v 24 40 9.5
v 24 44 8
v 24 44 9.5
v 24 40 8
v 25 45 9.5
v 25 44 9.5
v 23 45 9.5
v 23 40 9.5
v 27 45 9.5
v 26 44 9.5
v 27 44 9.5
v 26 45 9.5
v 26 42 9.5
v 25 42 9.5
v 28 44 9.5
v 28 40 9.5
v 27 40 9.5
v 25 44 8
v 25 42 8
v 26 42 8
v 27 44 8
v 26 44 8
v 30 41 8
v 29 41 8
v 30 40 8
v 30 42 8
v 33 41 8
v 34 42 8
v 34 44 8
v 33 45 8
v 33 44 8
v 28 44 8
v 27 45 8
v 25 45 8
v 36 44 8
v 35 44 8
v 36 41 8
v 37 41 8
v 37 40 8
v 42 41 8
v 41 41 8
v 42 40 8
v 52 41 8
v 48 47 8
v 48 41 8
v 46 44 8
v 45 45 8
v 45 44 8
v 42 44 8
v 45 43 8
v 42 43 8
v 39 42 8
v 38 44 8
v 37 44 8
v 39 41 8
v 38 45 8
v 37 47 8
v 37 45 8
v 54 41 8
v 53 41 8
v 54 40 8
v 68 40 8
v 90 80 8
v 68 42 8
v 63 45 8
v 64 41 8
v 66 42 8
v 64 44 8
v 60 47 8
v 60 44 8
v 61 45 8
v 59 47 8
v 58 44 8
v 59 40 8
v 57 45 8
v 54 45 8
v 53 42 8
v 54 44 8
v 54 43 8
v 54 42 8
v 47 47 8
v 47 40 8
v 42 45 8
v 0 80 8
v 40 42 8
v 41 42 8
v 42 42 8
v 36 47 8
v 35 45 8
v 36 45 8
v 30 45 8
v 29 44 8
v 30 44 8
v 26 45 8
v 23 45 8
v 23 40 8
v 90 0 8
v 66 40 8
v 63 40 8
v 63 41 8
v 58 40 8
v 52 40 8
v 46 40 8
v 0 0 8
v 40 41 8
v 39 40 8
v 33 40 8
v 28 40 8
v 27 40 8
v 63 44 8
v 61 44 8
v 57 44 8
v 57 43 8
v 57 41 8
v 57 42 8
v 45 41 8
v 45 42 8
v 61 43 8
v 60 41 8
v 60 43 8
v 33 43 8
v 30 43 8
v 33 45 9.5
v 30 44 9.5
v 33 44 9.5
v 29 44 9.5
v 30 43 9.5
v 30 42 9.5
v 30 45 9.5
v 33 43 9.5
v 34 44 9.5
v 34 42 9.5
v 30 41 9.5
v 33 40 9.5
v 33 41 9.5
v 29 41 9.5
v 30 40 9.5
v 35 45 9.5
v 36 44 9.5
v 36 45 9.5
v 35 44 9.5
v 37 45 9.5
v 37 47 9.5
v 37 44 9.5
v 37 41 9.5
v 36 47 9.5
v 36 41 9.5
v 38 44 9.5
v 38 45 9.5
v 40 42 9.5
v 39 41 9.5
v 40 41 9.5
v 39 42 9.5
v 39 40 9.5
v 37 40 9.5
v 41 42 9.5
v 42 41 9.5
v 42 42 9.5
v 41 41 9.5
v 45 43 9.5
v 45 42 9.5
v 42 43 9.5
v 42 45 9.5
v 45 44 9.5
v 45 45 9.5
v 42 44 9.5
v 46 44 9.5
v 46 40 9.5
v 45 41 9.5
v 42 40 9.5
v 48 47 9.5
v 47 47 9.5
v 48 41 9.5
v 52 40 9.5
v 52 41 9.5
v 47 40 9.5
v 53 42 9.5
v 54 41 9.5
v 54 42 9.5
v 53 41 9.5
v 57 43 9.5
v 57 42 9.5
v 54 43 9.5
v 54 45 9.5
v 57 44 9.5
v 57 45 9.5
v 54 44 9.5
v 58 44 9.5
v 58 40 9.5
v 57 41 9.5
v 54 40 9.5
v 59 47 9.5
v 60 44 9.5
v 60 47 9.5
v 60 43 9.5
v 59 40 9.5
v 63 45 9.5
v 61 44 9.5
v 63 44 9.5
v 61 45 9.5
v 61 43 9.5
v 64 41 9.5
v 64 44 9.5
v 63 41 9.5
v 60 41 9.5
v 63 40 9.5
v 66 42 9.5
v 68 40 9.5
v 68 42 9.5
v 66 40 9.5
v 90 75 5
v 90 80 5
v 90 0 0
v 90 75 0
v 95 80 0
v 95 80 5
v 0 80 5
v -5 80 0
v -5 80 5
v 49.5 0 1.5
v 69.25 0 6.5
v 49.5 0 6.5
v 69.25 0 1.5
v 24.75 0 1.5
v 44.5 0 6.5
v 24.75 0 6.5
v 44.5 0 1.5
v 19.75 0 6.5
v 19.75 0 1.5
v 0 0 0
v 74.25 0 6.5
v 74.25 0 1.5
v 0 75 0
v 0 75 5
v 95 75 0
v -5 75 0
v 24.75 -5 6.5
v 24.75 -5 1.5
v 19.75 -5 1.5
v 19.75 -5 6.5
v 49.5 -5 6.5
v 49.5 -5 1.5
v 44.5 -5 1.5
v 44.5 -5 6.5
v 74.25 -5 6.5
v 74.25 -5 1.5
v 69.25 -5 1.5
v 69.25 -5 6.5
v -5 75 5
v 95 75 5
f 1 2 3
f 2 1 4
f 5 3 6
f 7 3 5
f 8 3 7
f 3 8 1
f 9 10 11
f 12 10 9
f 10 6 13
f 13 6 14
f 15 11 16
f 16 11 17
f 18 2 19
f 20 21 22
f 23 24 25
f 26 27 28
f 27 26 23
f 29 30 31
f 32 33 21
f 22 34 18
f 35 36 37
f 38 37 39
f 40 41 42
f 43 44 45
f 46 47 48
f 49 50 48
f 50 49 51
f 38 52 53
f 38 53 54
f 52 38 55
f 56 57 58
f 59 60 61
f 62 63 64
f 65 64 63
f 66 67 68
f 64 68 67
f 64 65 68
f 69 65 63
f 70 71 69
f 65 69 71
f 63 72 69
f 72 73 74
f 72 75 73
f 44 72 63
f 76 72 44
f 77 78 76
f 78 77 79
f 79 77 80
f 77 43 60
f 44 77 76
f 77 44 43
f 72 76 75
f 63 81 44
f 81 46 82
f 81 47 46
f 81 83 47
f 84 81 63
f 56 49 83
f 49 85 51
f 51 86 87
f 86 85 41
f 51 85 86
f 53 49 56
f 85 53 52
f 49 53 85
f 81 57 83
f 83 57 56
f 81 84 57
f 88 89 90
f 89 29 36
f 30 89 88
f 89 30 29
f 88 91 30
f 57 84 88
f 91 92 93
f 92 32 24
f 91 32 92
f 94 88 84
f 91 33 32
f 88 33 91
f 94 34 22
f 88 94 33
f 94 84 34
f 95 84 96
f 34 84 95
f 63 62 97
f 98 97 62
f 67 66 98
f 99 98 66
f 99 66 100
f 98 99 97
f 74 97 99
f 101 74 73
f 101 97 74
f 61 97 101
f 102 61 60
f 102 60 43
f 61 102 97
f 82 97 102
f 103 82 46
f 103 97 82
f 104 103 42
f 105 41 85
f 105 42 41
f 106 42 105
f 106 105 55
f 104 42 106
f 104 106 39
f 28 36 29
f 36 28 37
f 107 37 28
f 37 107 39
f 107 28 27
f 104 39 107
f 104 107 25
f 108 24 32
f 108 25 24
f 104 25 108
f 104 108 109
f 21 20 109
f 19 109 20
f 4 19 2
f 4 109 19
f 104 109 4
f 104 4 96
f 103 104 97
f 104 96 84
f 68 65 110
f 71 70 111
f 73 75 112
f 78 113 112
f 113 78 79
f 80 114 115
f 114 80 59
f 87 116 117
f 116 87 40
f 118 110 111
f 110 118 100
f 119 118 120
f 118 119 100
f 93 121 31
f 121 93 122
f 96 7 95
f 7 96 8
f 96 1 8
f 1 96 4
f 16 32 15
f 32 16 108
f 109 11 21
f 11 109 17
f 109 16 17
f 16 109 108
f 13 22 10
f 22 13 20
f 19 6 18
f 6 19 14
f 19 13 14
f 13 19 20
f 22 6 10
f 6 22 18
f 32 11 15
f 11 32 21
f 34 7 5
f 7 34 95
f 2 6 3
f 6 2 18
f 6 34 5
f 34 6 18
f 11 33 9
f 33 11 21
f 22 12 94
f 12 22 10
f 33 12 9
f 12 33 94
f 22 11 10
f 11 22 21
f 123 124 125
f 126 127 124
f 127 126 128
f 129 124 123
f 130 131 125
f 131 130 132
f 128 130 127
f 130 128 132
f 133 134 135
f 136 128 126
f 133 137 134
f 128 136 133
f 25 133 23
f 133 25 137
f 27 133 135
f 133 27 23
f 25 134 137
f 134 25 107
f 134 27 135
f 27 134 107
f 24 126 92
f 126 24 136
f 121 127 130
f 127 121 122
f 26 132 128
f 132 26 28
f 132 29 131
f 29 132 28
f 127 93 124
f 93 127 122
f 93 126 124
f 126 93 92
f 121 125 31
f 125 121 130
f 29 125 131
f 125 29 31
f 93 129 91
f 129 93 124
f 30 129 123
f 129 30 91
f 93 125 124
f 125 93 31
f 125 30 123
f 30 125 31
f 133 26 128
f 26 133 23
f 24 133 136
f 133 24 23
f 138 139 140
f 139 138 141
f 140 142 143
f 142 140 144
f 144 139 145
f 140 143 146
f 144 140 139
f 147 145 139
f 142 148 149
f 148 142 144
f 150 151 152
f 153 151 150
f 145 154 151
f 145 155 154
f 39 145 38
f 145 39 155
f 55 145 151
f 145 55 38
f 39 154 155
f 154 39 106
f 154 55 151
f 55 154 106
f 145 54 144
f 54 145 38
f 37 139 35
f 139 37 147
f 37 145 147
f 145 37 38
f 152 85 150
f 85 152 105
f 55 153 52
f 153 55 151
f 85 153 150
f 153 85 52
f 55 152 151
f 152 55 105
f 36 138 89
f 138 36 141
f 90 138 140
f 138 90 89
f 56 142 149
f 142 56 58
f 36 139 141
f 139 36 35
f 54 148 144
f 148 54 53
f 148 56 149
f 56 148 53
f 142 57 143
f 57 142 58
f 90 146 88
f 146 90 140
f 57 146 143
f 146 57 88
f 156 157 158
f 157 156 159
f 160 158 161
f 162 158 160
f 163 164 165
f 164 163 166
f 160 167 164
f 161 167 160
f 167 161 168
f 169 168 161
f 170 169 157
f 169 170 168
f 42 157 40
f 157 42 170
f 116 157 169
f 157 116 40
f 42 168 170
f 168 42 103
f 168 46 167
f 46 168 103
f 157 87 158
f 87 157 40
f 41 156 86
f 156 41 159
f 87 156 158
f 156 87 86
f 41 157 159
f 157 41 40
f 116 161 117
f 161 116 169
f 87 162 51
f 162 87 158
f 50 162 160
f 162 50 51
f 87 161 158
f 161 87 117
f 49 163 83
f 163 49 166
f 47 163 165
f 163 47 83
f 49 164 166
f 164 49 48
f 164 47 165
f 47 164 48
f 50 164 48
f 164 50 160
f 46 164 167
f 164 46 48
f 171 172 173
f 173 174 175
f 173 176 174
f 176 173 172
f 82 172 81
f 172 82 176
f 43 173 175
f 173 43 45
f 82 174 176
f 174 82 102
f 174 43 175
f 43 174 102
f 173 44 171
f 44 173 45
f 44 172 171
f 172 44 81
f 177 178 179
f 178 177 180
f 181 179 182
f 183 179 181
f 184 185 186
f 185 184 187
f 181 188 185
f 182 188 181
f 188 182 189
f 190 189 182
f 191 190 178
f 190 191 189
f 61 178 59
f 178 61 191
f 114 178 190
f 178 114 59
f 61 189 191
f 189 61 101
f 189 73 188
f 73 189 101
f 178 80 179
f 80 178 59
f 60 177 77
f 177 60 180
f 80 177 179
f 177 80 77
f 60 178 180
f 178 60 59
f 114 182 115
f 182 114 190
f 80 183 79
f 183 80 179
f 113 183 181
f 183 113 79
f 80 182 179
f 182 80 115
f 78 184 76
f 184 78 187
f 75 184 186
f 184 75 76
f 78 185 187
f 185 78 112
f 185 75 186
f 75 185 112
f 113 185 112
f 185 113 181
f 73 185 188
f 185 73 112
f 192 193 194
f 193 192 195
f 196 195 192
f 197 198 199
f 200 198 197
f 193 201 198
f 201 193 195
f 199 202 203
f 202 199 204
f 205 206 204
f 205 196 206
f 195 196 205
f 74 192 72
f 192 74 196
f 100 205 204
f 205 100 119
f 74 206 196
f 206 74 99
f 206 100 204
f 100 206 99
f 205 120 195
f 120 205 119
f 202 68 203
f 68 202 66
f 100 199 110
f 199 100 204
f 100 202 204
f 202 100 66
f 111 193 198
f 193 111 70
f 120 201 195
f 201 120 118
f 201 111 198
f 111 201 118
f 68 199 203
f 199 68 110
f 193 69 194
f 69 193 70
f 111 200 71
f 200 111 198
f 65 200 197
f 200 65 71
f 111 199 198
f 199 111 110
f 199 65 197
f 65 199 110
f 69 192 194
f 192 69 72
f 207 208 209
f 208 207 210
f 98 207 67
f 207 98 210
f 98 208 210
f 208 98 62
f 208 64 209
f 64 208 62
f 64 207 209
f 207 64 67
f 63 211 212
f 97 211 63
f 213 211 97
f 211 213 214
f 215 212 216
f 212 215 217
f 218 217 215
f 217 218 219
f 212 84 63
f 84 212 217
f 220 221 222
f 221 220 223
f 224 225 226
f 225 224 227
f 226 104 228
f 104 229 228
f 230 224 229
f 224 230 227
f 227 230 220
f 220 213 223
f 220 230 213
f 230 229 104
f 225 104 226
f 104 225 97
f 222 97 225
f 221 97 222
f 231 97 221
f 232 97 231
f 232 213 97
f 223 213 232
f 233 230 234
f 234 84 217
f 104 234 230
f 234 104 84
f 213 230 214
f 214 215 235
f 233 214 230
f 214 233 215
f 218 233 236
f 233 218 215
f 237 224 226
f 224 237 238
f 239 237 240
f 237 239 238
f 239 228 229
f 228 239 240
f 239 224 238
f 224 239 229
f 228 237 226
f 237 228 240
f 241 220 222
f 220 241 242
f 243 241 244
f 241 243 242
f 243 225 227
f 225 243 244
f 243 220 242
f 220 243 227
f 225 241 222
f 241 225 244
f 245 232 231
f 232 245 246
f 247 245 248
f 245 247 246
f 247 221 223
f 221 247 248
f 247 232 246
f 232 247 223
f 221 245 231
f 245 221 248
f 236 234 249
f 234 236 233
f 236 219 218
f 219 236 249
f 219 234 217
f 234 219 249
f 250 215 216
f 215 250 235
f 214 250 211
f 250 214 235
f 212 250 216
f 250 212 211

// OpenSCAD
//
//if (accessories=="ON"){
//	color([222/255,184/255,135/255]) translate([-50,33.5,-3]) board();
//	translate([-10,15,0]) Arduino(0,0,0);
//} 
//if (mode=="EXPLODED"){
//	baseWCuts();
//	translate([-45,-80,30]) backDoor();
//	translate([0,30,30]) frontPanel();
//	translate([0,30,30]) mirror([1,0,0]) frontPanel();
//}
//if (mode=="ASSEMBLED"){
//	baseWCuts();
//	translate([-45,-50,0]) backDoor();
//	frontPanel();
//	mirror([1,0,0]) frontPanel();
//}
//if (mode=="PARTS"){
//	baseWCuts();
//	translate([280,-10,40]) rotate([270,0,0]) frontPanel();
//	translate([-250,0,10]) rotate([270,0,0]) backDoor();
//	translate([230,-10,40]) mirror([1,0,0]) rotate([270,0,0]) frontPanel();
//
//}

translate([0,0,8]) rotate([270,0,0]) backDoor();

//
///////////////////////////////
/* MAIN CONSTRUCTOR MODULES */
//////////////////////////////


//Creates exact front panel with cuts using frontPanelBasic()
module frontPanel(){ 
	difference(){
		translate([-126.5,52,0]) frontPanelBasic();
		baseWCuts();
		translate([-50,33.5,-3]) board();
		translate([65,10,95]) rotate([90,0,0]) cylinder(r=6.5,h=20);
		translate([-58,72.5,-10]) cylinder(r=3.25,h=20);//cuts panel screw holes
		translate([-84,72.5,-10]) cylinder(r=3.25,h=20);
	}
}

//Creates basic block front panel without cuts
module frontPanelBasic(){ 
	union(){
		cube([81.5,8,80]);
		translate([31.5,0,-3]) cube([50,33,8]);
		translate([73.5,-20,-5]) cube([8,20,85]);
		translate([-6.5,-23,0]) cube([8,31,80]);
	}
}

//Creates full base with sides, floor, and all necessary cuts
module baseWCuts(){
	difference(){
		base();
		translate([-50,33.5,-3]) board(); //cuts board
		translate([-10,15,0]) Arduino(0,0,0); //cuts arduino
		translate([-45,-50,0]) backDoor(); //cuts back door
		translate([-70,55,-3]) cube([140,30,3]); //cuts indent in prongs
		translate([-62.5,10,95]) rotate([90,0,0]) cylinder(r=3.25,h=20); //cuts hanger
		translate([62.5,10,95]) rotate([90,0,0]) cylinder(r=3.25,h=20);
		translate([-58,72.5,-10]) cylinder(r=3.25,h=20);//cuts panel screw holes
		translate([-84,72.5,-10]) cylinder(r=3.25,h=20);
		translate([58,72.5,-10]) cylinder(r=3.25,h=20);
		translate([84,72.5,-10]) cylinder(r=3.25,h=20);
		translate([-53,-5,2]) cube([15,15,15]); //cuts arduino extension port
		translate([-50,36.5,-3]) cube([100,20,3]);
	}
}

//Creates simple base with floor and sides
module base(){
	union(){
		translate([-53,-50,-8]) floor();
		translate([-53,-50,0]) sides();
		translate([-80,-4,80]) cube([35,12,25]); //creates top hinges 
		translate([45,-4,80]) cube([35,12,25]);
	}
}

//Creates back door that will fit into slots in the base.
module backDoor(){
	union(){
		cube([90,8,80]);
	
		translate([19.75,1.5,-5]) cube([5,5,5]); //bottom notches
		translate([44.5,1.5,-5]) cube([5,5,5]);
		translate([69.25,1.5,-5]) cube([5,5,5]);
	
		translate([-5,3,75]) cube([5,5,5]);//top notches
		translate([90,3,75]) cube([5,5,5]);
	
		translate([23,0,40]) rotate([90,0,0]) scale([1,1,1.5]) drawtext("metaLab."); //text
	}
}

//Creates walls including slants
module sides(){

	cube([8,85,80]);
	translate([98,0,0]) cube([8,85,80]);
	translate([-80,70,0]) slant();
	translate([186,70,0]) mirror([1,0,0]) slant();

}

//creates slanted L shaped wall
module slant(){
	polyhedron(
	points = [ [0,0,0],[80,0,0],[0,10,0],[8,10,0],[8,8,0], [80,8,0],
				[0,-20,80],[80,-20,80],[0,10,80],[8,10,80],[8,-12,80],
				[80,-12,80] ],

	faces = [ [0,1,5,4,3,2] ,[6,8,9,10,11,7], [2,8,6,0],
				[0,6,7,1], [1,7,11,5], [5,11,10,4], [4,10,9,3],
				[3,9,8,2]]


	);
}

//Creates floor of the enclosure
module floor(){
	union(){
		cube([106,86,8]);
		
		translate([-80,70,0]) cube([80,40,8]);//wings
		translate([106,70,0]) cube([80,40,8]);
	
		translate([-42,85,0]) cube([50,50,8]); //prongs
		translate([98,85,0]) cube([50,50,8]);
		diagonal();
		translate([106,0,0]) mirror([1,0,0]) diagonal();
	}
}

//Creates triangle inlet for floor
module diagonal(){
	polyhedron(
		points = [ [0,50,0],[0,70,0],[-20,70,0],[0,50,8],[0,70,8],[-20,70,8]],
		faces = [ [2,1,0],[3,4,5],[2,0,3,5],[0,1,4,3],[1,2,5,4] ]
	);
}

//Models enclosed circuit board
module board(){
	union(){
		cube([100,3,85]);
		translate([-87.5,-6,11.25]) cube([95,16,16]);//left
		translate([-87.5,-6,31.75]) cube([95,16,16]);
		translate([-87.5,-6,52.25]) cube([95,16,16]);
	
		translate([92.5,-6,11.25]) cube([95,16,16]);//right
		translate([92.5,-6,31.75]) cube([95,16,16]);
		translate([92.5,-6,52.25]) cube([95,16,16]);
	}
}

/////////////////////////
//TEXT DRAWING MODULES//
////////////////////////
//You can ignore these//

module drawtext(text) {
	//Characters
	chars = " !\"#$%&'()*+,-./0123456789:;<=>?@ABCDEFGHIJKLMNOPQRSTUVWXYZ[\\]^_`abcdefghijklmnopqrstuvwxyz{|}";

	//Chracter table defining 5x7 characters
	//Adapted from: http://www.geocities.com/dinceraydin/djlcdsim/chartable.js
	char_table = [ [ 0, 0, 0, 0, 0, 0, 0],
                  [ 4, 0, 4, 4, 4, 4, 4],
                  [ 0, 0, 0, 0,10,10,10],
                  [10,10,31,10,31,10,10],
                  [ 4,30, 5,14,20,15, 4],
                  [ 3,19, 8, 4, 2,25,24],
                  [13,18,21, 8,20,18,12],
                  [ 0, 0, 0, 0, 8, 4,12],
                  [ 2, 4, 8, 8, 8, 4, 2],
                  [ 8, 4, 2, 2, 2, 4, 8],
                  [ 0, 4,21,14,21, 4, 0],
                  [ 0, 4, 4,31, 4, 4, 0],
                  [ 8, 4,12, 0, 0, 0, 0],
                  [ 0, 0, 0,31, 0, 0, 0],
                  [12,12, 0, 0, 0, 0, 0],
                  [ 0,16, 8, 4, 2, 1, 0],
                  [14,17,25,21,19,17,14],
                  [14, 4, 4, 4, 4,12, 4],
                  [31, 8, 4, 2, 1,17,14],
                  [14,17, 1, 2, 4, 2,31],
                  [ 2, 2,31,18,10, 6, 2],
                  [14,17, 1, 1,30,16,31],
                  [14,17,17,30,16, 8, 6],
                  [ 8, 8, 8, 4, 2, 1,31],
                  [14,17,17,14,17,17,14],
                  [12, 2, 1,15,17,17,14],
                  [ 0,12,12, 0,12,12, 0],
                  [ 8, 4,12, 0,12,12, 0],
                  [ 2, 4, 8,16, 8, 4, 2],
                  [ 0, 0,31, 0,31, 0, 0],
                  [16, 8, 4, 2, 4, 8,16],
                  [ 4, 0, 4, 2, 1,17,14],
                  [14,21,21,13, 1,17,14],
                  [17,17,31,17,17,17,14],
                  [30,17,17,30,17,17,30],
                  [14,17,16,16,16,17,14],
                  [30,17,17,17,17,17,30],
                  [31,16,16,30,16,16,31],
                  [16,16,16,30,16,16,31],
                  [15,17,17,23,16,17,14],
                  [17,17,17,31,17,17,17],
                  [14, 4, 4, 4, 4, 4,14],
                  [12,18, 2, 2, 2, 2, 7],
                  [17,18,20,24,20,18,17],
                  [31,16,16,16,16,16,16],
                  [17,17,17,21,21,27,17],
                  [17,17,19,21,25,17,17],
                  [14,17,17,17,17,17,14],
                  [16,16,16,30,17,17,30],
                  [13,18,21,17,17,17,14],
                  [17,18,20,30,17,17,30],
                  [30, 1, 1,14,16,16,15],
                  [ 4, 4, 4, 4, 4, 4,31],
                  [14,17,17,17,17,17,17],
                  [ 4,10,17,17,17,17,17],
                  [10,21,21,21,17,17,17],
                  [17,17,10, 4,10,17,17],
                  [ 4, 4, 4,10,17,17,17],
                  [31,16, 8, 4, 2, 1,31],
                  [14, 8, 8, 8, 8, 8,14],
                  [ 0, 1, 2, 4, 8,16, 0],
                  [14, 2, 2, 2, 2, 2,14],
                  [ 0, 0, 0, 0,17,10, 4],
                  [31, 0, 0, 0, 0, 0, 0],
                  [ 0, 0, 0, 0, 2, 4, 8],
                  [15,17,15, 1,14, 0, 0],
                  [30,17,17,25,22,16,16],
                  [14,17,16,16,14, 0, 0],
                  [15,17,17,19,13, 1, 1],
                  [14,16,31,17,14, 0, 0],
                  [ 8, 8, 8,28, 8, 9, 6],
                  [14, 1,15,17,15, 0, 0],
                  [17,17,17,25,22,16,16],
                  [14, 4, 4, 4,12, 0, 4],
                  [12,18, 2, 2, 2, 6, 2],
                  [18,20,24,20,18,16,16],
                  [14, 4, 4, 4, 4, 4,12],
                  [17,17,21,21,26, 0, 0],
                  [17,17,17,25,22, 0, 0],
                  [14,17,17,17,14, 0, 0],
                  [16,16,30,17,30, 0, 0],
                  [ 1, 1,15,19,13, 0, 0],
                  [16,16,16,25,22, 0, 0],
                  [30, 1,14,16,15, 0, 0],
                  [ 6, 9, 8, 8,28, 8, 8],
                  [13,19,17,17,17, 0, 0],
                  [ 4,10,17,17,17, 0, 0],
                  [10,21,21,17,17, 0, 0],
                  [17,10, 4,10,17, 0, 0],
                  [14, 1,15,17,17, 0, 0],
                  [31, 8, 4, 2,31, 0, 0],
                  [ 2, 4, 4, 8, 4, 4, 2],
                  [ 4, 4, 4, 4, 4, 4, 4],
                  [ 8, 4, 4, 2, 4, 4, 8] ];

	//Binary decode table
	dec_table = [ "00000", "00001", "00010", "00011", "00100", "00101",
  	            "00110", "00111", "01000", "01001", "01010", "01011",
  	            "01100", "01101", "01110", "01111", "10000", "10001",
  	            "10010", "10011", "10100", "10101", "10110", "10111",
	            "11000", "11001", "11010", "11011", "11100", "11101",
	            "11110", "11111" ];

	//Process string one character at a time
	for(itext = [0:len(text)-1]) {
		//Convert character to index
		assign(ichar = search(text[itext],chars,1)[0]) {
			//Decode character - rows
			for(irow = [0:6]) {
				assign(val = dec_table[char_table[ichar][irow]]) {
					//Decode character - cols
					for(icol = [0:4]) {
						assign(bit = search(val[icol],"01",1)[0]) {
							if(bit) {
								//Output cube
								translate([icol + (6*itext), irow, 0])
									cube([1.0001,1.0001,1]);
							}
						}
					}
				}
			}
		}
	}
}


////////////////////////////
//ARDUINO DRAWING MODULES//
///////////////////////////
//You can ignore these//

board_height = 4;

module Arduino(solid_holes, combined_headers, extend_ports)
{
	echo(str("solid_holes: ", solid_holes));
	echo(str("combined_headers: ", combined_headers));
	echo(str("extend_ports: ", extend_ports));

	if (solid_holes == 1)
	{
		echo("solid holes");
		union()
		{
			Board();
			USB(extend_ports);
			PowerPlug(extend_ports);
			FemaleHeaders(combined_headers);
			MaleHeaders();
			ResetButton();
			ATMega();
			MountingHoles();
		}
	}
	else
	{
		echo("regular holes");
		difference()
		{
			union()
			{
				Board();
				USB(extend_ports);
				PowerPlug(extend_ports);
				FemaleHeaders(combined_headers);
				MaleHeaders();
				ResetButton();
				ATMega();
			}
			MountingHoles();
		}
	}
}

module ResetButton()
{
	translate([39, -26, board_height])
	{
		color([0.8, 0.8, 0.8])
		cube([6, 6, 2.2]);
		
		color([0.6, 0.4, 0.2])
		translate([3, 3, 0]) cylinder(r=1.4, h=3.5, $fn=25);
	}
}

module MaleHeaders()
{
	color([0.6, 0.6, 0.6])
	translate([0, 0, board_height])
	{
		translate([0, -7, 0]) cube([7, 5, 9.2]);
		translate([47.5, -26, 0]) cube([5, 7, 9.2]);
	}
}

module ATMega()
{
	color([0.3, 0.3, 0.3])
	translate([14, -39, board_height])
	{
		cube([35.5, 10, 7.5]);
	}
}

module FemaleHeaders(combined)
{
	color([0.3, 0.3, 0.3])
	translate([0, 0, board_height])
	{
		translate([0, -1, 0])
		{
			translate([7, 0, 0])
			{
				if(combined == 1)
				{
					cube([43, 2, 8.2]);
				}
				else
				{
					cube([21, 2, 8.2]);
					translate([22, 0, 0]) cube([21, 2, 8.2]);
				}
			}
		}

		translate([0, -50, 0])
		{
			translate([17, 0, 0])
			{
				if(combined == 1)
				{
					cube([33, 2, 8.2]);
				}
				else
				{
					cube([15.5, 2, 8.2]);
					translate([17.5, 0, 0]) cube([15.5, 2, 8.2]);
				}
			}
		}
	}
}

module PowerPlug(extended)
{
	if(extended == 1)
	{
		translate([-26.893, -47.4929962, board_height])
		color([0.3, 0.3, 0.3])
		cube([24, 9, 11]);
	}
	else
	{
		translate([-16.893, -47.4929962, board_height])
		color([0.3, 0.3, 0.3])
		cube([14, 9, 11]);
	}
}

module USB(extended)
{
	if(extended == 1)
	{
		translate([-31.465, -18.5623962, board_height])
		color([0.8, 0.8, 0.8])
		cube([26, 12, 11]);
	}
	else
	{
		translate([-61.465, -18.5623962, board_height])
		color([0.8, 0.8, 0.8])
		cube([56, 12, 11]);
	}
}


module Board()
{
	color([0, 0.6, 0.8])
	linear_extrude(height = board_height, convexity = 10, twist = 0)
	{
		polygon( points = [ [-15.115, 2.545],
						[49.4, 2.545],
						[50.925, 1.021],
						[50.925, -10.409],
						[53.465, -12.949],
						[53.465, -45.715],
						[50.925, -48.255],
						[50.925, -50.795],
						[-15.115, -50.795] ],
				paths = [[0, 1, 2, 3, 4, 5, 6, 7, 8]],
				convexity = 10);
	}
}

module MountingHoles()
{
	translate([0, 0, -10])
	{
		ArduinoHole(25);
		translate([-1.0929112, -48.4026972, 0]) ArduinoHole(25);
		translate([51, -15.25, 0]) ArduinoHole(25);
		translate([51, -43.25, 0]) ArduinoHole(25);
	}
}

module ArduinoHole(length)
{
	color([0.7, 0.7, 0.7])
	cylinder(r=1.5, h=length, $fn=25);
}
